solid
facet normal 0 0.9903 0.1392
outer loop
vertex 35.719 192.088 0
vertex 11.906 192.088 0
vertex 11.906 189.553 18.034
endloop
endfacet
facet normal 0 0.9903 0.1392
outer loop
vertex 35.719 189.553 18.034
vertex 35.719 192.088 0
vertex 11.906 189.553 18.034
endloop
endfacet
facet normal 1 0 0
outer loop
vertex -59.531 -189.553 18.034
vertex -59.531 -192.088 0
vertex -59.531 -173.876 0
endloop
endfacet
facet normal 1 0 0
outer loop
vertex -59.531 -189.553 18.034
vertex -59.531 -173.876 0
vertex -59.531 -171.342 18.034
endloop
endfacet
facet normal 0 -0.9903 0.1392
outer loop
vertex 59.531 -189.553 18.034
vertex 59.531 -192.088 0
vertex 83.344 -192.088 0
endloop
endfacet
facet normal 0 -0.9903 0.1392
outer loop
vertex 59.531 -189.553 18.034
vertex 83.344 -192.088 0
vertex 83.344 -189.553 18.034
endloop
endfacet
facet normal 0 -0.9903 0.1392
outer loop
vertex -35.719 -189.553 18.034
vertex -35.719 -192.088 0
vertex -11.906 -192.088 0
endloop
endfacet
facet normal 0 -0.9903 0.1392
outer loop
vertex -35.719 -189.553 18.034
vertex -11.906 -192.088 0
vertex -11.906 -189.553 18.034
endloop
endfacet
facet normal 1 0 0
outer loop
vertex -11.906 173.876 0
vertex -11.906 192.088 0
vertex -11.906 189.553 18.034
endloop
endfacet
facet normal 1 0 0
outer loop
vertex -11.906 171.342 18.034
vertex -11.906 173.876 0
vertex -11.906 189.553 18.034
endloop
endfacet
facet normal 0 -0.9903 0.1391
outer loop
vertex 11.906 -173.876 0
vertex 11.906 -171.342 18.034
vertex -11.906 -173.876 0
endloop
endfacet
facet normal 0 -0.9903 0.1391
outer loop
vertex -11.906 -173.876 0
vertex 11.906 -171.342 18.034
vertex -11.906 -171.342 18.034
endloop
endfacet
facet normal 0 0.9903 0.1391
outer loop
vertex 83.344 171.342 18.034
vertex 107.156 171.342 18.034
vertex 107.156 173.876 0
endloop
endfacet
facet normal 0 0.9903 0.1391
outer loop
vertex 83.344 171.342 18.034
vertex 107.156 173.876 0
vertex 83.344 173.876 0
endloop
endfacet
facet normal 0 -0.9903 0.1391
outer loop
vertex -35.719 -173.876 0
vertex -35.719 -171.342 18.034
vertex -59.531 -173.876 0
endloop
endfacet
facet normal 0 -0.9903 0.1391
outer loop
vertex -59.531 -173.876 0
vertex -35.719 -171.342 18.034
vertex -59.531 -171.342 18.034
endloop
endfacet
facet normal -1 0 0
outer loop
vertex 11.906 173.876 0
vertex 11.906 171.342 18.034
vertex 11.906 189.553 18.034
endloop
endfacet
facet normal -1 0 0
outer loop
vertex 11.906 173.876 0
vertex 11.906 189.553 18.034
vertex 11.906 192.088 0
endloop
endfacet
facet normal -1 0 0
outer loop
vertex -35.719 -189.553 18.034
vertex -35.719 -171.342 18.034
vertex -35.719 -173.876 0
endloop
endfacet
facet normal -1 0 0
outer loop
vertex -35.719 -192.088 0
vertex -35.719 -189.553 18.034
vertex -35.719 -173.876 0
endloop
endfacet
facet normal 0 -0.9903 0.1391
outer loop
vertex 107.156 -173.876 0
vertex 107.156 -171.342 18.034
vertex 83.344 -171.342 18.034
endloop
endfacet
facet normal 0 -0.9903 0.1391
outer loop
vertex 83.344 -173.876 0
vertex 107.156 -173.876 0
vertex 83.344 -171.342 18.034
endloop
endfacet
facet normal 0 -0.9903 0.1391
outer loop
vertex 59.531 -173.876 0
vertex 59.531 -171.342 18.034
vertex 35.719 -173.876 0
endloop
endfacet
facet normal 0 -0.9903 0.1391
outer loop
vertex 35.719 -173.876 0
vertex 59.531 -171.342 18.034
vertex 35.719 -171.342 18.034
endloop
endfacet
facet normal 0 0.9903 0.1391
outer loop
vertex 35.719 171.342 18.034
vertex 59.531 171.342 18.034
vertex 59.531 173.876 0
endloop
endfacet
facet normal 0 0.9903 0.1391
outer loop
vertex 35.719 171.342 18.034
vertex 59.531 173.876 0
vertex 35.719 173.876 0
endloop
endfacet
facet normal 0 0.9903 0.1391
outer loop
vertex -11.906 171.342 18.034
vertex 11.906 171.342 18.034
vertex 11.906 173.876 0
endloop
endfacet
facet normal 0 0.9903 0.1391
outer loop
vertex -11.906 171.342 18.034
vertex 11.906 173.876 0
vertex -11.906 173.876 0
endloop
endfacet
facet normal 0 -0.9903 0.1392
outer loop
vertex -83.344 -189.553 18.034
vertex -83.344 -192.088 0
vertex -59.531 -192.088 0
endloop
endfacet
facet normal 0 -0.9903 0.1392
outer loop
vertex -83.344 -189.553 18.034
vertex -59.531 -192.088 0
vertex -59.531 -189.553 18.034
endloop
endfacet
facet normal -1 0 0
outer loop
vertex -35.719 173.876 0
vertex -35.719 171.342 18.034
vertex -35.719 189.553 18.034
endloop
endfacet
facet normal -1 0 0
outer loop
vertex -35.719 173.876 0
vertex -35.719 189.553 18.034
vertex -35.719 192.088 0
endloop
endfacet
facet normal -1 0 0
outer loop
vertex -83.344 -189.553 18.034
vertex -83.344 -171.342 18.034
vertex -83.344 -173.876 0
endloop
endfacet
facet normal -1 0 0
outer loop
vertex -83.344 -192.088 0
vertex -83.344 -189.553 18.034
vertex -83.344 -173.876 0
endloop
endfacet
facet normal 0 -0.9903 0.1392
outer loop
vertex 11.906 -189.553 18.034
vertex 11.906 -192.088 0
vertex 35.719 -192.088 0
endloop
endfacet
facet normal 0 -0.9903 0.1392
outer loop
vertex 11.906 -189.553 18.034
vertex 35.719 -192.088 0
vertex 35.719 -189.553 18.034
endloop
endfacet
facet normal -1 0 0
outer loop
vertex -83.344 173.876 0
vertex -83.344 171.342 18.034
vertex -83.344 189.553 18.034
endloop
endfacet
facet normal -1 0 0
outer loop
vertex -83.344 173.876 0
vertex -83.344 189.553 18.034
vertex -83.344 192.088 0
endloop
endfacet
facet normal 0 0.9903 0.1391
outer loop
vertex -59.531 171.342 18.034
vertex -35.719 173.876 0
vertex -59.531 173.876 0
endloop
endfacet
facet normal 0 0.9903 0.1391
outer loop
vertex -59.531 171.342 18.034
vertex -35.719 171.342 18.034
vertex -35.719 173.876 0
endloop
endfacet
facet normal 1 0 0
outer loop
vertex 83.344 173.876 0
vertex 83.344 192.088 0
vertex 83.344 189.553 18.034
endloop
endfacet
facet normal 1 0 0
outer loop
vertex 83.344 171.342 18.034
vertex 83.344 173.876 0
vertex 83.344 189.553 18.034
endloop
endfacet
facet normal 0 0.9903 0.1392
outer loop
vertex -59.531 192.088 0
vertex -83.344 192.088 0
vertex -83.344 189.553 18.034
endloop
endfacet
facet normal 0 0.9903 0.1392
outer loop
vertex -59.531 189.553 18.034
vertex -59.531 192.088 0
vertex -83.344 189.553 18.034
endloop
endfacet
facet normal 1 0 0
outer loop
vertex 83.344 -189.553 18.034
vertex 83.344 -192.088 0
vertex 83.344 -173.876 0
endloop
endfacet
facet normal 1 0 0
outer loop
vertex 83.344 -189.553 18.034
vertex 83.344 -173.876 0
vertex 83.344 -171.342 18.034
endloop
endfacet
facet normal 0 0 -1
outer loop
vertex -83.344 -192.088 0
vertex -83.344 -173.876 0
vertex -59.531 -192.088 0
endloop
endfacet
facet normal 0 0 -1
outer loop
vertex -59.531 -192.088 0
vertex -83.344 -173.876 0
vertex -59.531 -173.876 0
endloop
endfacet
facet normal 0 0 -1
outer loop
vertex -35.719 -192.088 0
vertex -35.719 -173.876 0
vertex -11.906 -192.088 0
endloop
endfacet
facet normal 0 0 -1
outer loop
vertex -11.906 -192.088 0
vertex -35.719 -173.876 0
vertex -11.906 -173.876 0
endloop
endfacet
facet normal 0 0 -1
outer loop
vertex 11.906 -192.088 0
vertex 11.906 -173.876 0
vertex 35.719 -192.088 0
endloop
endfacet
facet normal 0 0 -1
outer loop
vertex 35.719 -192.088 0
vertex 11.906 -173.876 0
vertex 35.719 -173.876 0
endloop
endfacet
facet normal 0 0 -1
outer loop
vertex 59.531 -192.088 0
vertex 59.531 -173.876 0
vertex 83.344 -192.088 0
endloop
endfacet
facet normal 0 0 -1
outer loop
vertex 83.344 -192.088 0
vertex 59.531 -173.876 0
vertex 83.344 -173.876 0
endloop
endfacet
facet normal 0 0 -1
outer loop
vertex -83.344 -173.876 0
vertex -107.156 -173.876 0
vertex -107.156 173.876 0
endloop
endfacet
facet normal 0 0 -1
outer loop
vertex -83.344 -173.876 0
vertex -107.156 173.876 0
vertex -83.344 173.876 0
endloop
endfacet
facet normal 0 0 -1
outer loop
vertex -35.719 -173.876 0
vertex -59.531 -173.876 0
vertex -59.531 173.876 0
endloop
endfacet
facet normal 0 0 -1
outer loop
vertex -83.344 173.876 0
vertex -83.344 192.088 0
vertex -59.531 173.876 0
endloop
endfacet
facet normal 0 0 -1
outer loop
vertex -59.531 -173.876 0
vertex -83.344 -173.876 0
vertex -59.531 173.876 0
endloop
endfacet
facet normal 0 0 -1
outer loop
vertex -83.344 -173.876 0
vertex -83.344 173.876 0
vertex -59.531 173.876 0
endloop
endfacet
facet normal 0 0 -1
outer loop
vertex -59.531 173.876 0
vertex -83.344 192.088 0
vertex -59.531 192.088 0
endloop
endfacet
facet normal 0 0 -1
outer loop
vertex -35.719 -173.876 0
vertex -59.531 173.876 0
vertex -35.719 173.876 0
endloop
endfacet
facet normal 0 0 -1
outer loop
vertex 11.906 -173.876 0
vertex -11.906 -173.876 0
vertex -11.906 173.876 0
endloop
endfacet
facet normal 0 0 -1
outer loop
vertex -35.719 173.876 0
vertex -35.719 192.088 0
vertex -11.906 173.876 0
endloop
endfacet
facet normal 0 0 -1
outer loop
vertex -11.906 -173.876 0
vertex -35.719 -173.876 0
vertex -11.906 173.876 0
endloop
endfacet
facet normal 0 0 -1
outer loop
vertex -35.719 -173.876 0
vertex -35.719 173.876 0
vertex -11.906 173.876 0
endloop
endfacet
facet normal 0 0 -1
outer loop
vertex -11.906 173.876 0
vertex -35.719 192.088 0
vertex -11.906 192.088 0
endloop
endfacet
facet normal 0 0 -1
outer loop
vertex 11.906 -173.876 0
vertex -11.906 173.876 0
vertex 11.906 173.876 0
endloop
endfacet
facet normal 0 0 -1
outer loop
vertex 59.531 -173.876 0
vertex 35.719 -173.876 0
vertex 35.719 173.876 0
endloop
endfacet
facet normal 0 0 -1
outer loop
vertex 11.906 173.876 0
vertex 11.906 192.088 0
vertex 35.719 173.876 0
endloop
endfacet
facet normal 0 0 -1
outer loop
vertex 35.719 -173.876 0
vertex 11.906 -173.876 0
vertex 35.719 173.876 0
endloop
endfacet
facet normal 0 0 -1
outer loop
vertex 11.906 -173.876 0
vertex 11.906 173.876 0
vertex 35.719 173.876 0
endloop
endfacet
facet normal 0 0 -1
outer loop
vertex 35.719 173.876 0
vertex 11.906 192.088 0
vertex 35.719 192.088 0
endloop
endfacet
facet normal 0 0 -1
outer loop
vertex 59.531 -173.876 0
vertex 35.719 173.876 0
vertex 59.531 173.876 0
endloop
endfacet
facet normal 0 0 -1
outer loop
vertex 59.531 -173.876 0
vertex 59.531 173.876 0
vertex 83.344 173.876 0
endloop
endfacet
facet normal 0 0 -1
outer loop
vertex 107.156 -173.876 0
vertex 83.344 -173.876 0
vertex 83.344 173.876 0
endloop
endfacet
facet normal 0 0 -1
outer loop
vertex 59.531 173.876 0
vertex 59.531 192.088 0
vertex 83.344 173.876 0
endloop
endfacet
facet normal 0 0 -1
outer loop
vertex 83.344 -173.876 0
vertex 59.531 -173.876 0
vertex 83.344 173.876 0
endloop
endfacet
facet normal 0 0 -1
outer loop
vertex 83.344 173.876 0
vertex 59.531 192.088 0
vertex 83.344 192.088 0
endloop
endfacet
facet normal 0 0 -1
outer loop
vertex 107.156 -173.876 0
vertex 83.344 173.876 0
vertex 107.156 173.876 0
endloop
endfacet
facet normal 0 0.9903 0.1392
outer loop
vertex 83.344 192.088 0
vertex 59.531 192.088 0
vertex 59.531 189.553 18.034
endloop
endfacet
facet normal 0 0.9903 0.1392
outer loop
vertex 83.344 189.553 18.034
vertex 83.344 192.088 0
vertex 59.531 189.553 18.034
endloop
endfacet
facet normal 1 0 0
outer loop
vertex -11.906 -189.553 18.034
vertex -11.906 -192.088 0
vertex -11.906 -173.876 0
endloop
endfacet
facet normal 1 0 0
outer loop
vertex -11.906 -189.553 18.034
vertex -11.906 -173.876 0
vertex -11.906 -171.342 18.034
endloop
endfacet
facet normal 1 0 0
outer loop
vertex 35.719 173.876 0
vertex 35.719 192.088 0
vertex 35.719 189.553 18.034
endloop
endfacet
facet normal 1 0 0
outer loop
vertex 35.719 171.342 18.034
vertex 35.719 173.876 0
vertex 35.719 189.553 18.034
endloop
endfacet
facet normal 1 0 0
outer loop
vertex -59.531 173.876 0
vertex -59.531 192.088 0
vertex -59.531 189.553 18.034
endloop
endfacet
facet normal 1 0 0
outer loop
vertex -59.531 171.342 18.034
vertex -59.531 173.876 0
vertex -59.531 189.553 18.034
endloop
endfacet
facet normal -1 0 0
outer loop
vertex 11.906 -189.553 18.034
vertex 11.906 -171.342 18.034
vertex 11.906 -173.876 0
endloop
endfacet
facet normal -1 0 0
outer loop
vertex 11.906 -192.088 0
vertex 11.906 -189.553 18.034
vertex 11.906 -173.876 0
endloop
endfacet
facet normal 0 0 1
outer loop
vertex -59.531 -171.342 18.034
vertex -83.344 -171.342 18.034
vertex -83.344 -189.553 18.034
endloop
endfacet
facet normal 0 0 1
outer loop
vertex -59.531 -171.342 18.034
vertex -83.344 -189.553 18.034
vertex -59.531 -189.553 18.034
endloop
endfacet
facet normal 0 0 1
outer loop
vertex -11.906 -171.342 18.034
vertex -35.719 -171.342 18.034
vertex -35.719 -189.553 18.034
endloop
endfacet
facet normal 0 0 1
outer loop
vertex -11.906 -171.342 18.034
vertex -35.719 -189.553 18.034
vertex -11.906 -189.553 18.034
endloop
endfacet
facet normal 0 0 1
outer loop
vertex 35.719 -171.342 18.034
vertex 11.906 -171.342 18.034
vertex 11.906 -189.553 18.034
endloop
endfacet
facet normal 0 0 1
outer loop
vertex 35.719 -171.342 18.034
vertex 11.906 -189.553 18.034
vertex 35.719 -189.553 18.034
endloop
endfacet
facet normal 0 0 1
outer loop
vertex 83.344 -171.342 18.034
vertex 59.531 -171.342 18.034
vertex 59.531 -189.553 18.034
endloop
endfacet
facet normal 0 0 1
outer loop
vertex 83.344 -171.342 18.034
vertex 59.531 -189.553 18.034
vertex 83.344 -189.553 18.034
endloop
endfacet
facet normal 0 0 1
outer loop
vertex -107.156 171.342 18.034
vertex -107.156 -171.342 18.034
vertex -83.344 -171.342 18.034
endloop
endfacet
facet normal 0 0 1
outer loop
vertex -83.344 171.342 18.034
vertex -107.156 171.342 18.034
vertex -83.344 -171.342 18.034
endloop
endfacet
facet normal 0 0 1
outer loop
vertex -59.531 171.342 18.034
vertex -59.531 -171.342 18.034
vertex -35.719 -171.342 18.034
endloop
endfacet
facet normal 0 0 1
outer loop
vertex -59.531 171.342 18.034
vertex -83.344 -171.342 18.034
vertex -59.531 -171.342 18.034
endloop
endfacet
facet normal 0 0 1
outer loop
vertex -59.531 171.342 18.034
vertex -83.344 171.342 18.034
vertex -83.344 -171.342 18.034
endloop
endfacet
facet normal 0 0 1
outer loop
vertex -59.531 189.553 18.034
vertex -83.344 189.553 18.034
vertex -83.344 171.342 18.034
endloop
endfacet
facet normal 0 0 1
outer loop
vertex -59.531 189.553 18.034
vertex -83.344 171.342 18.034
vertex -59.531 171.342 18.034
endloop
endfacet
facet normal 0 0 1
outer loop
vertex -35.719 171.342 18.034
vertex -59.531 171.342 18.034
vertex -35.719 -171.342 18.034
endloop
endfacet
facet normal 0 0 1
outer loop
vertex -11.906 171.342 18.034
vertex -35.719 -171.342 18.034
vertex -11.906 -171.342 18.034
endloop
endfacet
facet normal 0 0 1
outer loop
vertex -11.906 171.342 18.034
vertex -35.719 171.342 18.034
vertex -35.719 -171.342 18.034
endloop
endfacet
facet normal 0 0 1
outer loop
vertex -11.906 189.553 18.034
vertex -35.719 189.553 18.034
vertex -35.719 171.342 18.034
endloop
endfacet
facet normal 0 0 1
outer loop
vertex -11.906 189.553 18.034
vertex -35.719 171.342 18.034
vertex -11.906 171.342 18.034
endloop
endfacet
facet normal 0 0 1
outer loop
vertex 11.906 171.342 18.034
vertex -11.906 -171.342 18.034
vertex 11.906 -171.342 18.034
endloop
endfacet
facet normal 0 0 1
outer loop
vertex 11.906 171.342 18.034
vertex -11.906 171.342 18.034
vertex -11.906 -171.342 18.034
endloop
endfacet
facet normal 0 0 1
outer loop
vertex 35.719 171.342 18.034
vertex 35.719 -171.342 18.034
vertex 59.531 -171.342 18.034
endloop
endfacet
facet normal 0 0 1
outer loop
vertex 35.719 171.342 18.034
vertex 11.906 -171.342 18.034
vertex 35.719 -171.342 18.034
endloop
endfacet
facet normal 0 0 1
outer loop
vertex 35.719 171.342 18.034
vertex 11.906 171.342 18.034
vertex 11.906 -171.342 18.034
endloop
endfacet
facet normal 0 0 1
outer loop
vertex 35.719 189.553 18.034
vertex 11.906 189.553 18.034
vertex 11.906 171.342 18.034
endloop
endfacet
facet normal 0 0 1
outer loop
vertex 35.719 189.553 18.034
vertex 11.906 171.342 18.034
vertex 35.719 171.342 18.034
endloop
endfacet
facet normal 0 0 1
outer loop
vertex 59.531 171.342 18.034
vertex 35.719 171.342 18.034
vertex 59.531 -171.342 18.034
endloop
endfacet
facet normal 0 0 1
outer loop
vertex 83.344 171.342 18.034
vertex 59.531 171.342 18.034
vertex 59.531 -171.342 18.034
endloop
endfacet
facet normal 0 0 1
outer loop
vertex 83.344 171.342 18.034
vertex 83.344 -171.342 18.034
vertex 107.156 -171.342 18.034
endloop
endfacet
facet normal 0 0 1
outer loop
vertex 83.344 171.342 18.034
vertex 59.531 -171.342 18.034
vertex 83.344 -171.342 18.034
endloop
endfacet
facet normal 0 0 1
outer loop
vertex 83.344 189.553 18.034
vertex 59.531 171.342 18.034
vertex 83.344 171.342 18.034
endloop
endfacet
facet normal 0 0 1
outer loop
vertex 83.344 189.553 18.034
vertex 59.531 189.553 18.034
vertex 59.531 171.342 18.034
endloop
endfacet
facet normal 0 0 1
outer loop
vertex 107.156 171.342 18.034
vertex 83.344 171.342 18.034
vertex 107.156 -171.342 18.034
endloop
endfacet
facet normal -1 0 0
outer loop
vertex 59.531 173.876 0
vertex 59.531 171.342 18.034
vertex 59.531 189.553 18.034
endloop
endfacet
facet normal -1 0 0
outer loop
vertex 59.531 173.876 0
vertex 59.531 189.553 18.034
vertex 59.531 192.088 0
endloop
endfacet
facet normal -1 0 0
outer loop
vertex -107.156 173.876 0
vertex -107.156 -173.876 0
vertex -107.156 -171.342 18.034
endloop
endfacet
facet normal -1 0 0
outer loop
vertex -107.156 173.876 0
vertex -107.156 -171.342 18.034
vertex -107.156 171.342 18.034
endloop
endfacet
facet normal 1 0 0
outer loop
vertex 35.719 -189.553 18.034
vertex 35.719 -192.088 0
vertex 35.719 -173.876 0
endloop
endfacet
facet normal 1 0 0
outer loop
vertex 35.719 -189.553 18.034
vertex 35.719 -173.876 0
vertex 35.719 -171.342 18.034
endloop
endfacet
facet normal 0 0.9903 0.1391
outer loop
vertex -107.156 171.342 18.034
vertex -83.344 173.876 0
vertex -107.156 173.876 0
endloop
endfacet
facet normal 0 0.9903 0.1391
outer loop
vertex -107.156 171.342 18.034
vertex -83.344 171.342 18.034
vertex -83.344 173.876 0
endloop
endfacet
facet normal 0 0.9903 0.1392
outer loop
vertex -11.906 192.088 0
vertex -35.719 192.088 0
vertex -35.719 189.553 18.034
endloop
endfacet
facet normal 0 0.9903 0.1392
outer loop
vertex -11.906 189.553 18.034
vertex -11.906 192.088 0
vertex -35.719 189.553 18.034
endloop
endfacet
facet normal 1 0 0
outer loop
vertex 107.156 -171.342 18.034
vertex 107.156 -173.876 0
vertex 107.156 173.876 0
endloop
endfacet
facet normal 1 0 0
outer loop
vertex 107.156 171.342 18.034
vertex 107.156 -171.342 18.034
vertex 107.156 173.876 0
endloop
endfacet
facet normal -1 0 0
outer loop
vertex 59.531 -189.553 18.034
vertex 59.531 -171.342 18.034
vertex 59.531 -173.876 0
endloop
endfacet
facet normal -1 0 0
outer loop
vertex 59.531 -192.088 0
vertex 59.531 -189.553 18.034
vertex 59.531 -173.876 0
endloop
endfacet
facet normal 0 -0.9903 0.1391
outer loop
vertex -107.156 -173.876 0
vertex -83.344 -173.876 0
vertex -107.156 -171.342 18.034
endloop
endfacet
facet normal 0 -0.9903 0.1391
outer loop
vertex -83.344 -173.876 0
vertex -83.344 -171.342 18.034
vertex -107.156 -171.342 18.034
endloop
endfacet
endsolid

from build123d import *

# Parameters (mm, degrees)
F0_W     = 214.3125
F0_H     = 384.175
F1_DEPTH = 18.034
F3_DEPTH = 214.3125
F6_DEPTH = 18.034


# Not quite as in the source:
# - a pattern or mirror of a feature is missing from the dataset's text; its kind, count and spacing are read off the source's solid


with BuildPart() as f1:
    # F0 (on Top) → F1 (new body)
    with BuildSketch(Plane.XY):
        Rectangle(F0_W, F0_H)
    extrude(amount=F1_DEPTH)

    # F2 (on face) → F3 (cut, through all)
    with BuildSketch(Plane(origin=(-107.15625, 0, 0), x_dir=(0, -1, 0), z_dir=(-1, 0, 0))):
        Polygon((-204.7875, 0), (-192.0875, 0), (-189.552986587, 18.034), (-204.7875, 18.034), align=None)
    f3 = extrude(amount=-F3_DEPTH, mode=Mode.SUBTRACT)

    # F3_copies: F3 across plane
    add(f3.mirror(Plane(origin=(0, 0, 0), x_dir=(0, 0, -1), z_dir=(0, -1, 0))), mode=Mode.SUBTRACT)

    # F5 (on offset) → F6 (cut)
    with BuildSketch(Plane(origin=(0, 188.3669280093, 26.4732452927), x_dir=(-1, 0, 0), z_dir=(0, 0.9902680687, 0.139173101))):
        Polygon((-83.34375, -1.3334130307), (-107.15625, -1.3334130307), (-107.15625, -26.7334130307), (-107.15625, -33.0834130307), (107.15625, -33.0834130307), (107.15625, -26.7334130307), (107.15625, -1.3334130307), (83.34375, -1.3334130307), (83.34375, -26.7334130307), (59.53125, -26.7334130307), (59.53125, -1.3334130307), (35.71875, -1.3334130307), (35.71875, -26.7334130307), (11.90625, -26.7334130307), (11.90625, -1.3334130307), (-11.90625, -1.3334130307), (-11.90625, -26.7334130307), (-35.71875, -26.7334130307), (-35.71875, -1.3334130307), (-59.53125, -1.3334130307), (-59.53125, -26.7334130307), (-83.34375, -26.7334130307), align=None)
    f6 = extrude(amount=-F6_DEPTH, mode=Mode.SUBTRACT)

    # F6_copies: F6 across plane
    add(f6.mirror(Plane(origin=(0, 0, 0), x_dir=(0, 0, -1), z_dir=(0, -1, 0))), mode=Mode.SUBTRACT)


solid = f1.part
